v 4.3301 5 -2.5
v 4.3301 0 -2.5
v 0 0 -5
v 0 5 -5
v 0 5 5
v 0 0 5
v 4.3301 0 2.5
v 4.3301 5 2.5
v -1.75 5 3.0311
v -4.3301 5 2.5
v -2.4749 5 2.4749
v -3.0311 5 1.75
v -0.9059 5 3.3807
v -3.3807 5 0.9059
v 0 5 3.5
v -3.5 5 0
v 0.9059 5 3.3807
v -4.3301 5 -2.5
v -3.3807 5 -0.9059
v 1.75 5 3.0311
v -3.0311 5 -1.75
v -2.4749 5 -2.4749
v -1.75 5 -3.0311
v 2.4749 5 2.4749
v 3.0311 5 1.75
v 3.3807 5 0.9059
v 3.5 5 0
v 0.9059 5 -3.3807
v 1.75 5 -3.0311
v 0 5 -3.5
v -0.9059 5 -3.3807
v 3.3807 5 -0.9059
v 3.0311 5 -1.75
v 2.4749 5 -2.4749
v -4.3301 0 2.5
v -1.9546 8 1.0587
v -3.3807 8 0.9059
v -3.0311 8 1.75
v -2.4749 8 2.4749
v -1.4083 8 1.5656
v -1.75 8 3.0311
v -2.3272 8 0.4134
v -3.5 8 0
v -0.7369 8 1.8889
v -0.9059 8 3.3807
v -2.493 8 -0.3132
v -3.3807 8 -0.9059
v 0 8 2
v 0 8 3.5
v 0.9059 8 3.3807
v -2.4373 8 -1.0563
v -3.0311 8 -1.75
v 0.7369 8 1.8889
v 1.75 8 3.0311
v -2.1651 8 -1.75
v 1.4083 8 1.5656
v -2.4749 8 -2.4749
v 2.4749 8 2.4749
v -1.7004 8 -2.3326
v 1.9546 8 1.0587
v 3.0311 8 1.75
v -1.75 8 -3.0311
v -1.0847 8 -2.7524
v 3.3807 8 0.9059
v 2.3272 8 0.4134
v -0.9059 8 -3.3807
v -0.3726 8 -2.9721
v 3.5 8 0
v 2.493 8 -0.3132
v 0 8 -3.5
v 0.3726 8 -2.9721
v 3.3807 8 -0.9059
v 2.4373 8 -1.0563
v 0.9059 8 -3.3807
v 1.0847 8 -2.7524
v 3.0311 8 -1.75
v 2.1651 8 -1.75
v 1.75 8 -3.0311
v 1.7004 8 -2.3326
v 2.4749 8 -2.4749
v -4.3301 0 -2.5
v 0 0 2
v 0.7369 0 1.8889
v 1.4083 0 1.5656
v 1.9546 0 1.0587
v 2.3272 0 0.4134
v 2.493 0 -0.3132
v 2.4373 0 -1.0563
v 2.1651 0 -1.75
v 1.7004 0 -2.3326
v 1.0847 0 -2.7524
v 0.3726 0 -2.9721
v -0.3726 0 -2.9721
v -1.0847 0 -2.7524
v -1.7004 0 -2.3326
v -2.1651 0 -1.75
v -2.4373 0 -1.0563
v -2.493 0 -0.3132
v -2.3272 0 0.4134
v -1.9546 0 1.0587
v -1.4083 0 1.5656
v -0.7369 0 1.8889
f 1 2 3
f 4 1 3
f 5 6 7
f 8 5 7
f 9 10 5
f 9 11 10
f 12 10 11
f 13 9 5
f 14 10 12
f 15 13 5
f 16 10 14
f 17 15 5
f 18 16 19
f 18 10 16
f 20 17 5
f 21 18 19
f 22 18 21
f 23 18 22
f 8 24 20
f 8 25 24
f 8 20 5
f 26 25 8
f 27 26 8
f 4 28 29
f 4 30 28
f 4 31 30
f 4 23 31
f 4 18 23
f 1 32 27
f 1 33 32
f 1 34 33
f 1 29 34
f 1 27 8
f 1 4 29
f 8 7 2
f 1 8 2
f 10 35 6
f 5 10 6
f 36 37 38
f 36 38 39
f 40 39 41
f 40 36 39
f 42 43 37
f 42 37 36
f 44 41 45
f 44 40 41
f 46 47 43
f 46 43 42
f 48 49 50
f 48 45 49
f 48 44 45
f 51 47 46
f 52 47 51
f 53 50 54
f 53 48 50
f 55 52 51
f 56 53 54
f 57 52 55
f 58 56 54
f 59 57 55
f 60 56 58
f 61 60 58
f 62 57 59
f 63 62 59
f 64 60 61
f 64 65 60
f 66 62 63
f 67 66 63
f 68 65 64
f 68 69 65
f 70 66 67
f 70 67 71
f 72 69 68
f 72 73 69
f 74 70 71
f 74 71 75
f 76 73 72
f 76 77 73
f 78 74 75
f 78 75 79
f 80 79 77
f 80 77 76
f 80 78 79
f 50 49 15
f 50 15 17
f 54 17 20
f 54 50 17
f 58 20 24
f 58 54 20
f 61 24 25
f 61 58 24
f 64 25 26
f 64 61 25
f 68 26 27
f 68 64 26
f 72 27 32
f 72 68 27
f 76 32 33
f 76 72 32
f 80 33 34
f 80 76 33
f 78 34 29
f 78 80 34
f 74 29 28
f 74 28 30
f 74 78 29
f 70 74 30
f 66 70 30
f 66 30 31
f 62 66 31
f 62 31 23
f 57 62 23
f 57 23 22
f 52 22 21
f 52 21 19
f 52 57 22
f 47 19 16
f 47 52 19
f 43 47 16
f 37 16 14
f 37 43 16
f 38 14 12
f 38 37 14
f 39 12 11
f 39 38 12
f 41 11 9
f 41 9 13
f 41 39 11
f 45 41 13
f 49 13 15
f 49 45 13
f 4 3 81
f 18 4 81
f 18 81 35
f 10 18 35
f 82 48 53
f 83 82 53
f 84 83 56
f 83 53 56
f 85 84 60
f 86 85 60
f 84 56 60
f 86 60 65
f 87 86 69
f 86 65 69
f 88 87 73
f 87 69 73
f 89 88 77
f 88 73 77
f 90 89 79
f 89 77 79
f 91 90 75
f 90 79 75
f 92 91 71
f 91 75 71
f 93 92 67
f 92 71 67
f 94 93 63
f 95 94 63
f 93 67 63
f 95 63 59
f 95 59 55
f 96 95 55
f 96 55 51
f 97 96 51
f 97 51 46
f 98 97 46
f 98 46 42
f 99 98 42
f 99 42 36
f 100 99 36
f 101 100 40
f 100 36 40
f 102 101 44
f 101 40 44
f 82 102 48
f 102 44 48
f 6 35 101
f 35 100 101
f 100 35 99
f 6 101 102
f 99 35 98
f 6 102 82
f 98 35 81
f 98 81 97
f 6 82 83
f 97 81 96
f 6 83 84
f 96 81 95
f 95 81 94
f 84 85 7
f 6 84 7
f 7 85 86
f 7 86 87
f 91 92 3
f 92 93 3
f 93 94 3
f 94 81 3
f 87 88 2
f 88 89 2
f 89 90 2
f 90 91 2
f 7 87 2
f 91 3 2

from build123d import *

# Parameters (mm, degrees)
BOSS_EXTRUDE1_DEPTH = 8
SKETCH2_R           = 2.5
CUT_EXTRUDE1_DEPTH  = 8
SKETCH3_R           = 3.5
CUT_EXTRUDE2_DEPTH  = 3


with BuildPart() as part:
    # Sketch1 → Boss-Extrude1 (new body)
    with BuildSketch(Plane(origin=(0, 0, 0), x_dir=(1, 0, 0), z_dir=(0, 1, 0))):
        Polygon((4.330127019, 2.5), (0, 5), (-4.330127019, 2.5), (-4.330127019, -2.5), (0, -5), (4.330127019, -2.5), align=None)
    extrude(amount=BOSS_EXTRUDE1_DEPTH)

    # Sketch2 → Cut-Extrude1 (cut)
    with BuildSketch(Plane(origin=(0, 8, 0), x_dir=(1, 0, 0), z_dir=(0, 1, 0))):
        with Locations(Location((0, 0.5, 0), (0, 0, 270))):
            Circle(SKETCH2_R)
    extrude(amount=-CUT_EXTRUDE1_DEPTH, mode=Mode.SUBTRACT)

    # Sketch3 → Cut-Extrude2 (cut)
    with BuildSketch(Plane(origin=(0, 8, 0), x_dir=(1, 0, 0), z_dir=(0, 1, 0))):
        Polygon((-4.330127019, 2.5), (-4.330127019, -2.5), (0, -5), (4.330127019, -2.5), (4.330127019, 2.5), (0, 5), align=None)
        with Locations(Location((0, 0, 0), (0, 0, 270))):
            Circle(SKETCH3_R, mode=Mode.SUBTRACT)
    extrude(amount=-CUT_EXTRUDE2_DEPTH, mode=Mode.SUBTRACT)


solid = part.part
